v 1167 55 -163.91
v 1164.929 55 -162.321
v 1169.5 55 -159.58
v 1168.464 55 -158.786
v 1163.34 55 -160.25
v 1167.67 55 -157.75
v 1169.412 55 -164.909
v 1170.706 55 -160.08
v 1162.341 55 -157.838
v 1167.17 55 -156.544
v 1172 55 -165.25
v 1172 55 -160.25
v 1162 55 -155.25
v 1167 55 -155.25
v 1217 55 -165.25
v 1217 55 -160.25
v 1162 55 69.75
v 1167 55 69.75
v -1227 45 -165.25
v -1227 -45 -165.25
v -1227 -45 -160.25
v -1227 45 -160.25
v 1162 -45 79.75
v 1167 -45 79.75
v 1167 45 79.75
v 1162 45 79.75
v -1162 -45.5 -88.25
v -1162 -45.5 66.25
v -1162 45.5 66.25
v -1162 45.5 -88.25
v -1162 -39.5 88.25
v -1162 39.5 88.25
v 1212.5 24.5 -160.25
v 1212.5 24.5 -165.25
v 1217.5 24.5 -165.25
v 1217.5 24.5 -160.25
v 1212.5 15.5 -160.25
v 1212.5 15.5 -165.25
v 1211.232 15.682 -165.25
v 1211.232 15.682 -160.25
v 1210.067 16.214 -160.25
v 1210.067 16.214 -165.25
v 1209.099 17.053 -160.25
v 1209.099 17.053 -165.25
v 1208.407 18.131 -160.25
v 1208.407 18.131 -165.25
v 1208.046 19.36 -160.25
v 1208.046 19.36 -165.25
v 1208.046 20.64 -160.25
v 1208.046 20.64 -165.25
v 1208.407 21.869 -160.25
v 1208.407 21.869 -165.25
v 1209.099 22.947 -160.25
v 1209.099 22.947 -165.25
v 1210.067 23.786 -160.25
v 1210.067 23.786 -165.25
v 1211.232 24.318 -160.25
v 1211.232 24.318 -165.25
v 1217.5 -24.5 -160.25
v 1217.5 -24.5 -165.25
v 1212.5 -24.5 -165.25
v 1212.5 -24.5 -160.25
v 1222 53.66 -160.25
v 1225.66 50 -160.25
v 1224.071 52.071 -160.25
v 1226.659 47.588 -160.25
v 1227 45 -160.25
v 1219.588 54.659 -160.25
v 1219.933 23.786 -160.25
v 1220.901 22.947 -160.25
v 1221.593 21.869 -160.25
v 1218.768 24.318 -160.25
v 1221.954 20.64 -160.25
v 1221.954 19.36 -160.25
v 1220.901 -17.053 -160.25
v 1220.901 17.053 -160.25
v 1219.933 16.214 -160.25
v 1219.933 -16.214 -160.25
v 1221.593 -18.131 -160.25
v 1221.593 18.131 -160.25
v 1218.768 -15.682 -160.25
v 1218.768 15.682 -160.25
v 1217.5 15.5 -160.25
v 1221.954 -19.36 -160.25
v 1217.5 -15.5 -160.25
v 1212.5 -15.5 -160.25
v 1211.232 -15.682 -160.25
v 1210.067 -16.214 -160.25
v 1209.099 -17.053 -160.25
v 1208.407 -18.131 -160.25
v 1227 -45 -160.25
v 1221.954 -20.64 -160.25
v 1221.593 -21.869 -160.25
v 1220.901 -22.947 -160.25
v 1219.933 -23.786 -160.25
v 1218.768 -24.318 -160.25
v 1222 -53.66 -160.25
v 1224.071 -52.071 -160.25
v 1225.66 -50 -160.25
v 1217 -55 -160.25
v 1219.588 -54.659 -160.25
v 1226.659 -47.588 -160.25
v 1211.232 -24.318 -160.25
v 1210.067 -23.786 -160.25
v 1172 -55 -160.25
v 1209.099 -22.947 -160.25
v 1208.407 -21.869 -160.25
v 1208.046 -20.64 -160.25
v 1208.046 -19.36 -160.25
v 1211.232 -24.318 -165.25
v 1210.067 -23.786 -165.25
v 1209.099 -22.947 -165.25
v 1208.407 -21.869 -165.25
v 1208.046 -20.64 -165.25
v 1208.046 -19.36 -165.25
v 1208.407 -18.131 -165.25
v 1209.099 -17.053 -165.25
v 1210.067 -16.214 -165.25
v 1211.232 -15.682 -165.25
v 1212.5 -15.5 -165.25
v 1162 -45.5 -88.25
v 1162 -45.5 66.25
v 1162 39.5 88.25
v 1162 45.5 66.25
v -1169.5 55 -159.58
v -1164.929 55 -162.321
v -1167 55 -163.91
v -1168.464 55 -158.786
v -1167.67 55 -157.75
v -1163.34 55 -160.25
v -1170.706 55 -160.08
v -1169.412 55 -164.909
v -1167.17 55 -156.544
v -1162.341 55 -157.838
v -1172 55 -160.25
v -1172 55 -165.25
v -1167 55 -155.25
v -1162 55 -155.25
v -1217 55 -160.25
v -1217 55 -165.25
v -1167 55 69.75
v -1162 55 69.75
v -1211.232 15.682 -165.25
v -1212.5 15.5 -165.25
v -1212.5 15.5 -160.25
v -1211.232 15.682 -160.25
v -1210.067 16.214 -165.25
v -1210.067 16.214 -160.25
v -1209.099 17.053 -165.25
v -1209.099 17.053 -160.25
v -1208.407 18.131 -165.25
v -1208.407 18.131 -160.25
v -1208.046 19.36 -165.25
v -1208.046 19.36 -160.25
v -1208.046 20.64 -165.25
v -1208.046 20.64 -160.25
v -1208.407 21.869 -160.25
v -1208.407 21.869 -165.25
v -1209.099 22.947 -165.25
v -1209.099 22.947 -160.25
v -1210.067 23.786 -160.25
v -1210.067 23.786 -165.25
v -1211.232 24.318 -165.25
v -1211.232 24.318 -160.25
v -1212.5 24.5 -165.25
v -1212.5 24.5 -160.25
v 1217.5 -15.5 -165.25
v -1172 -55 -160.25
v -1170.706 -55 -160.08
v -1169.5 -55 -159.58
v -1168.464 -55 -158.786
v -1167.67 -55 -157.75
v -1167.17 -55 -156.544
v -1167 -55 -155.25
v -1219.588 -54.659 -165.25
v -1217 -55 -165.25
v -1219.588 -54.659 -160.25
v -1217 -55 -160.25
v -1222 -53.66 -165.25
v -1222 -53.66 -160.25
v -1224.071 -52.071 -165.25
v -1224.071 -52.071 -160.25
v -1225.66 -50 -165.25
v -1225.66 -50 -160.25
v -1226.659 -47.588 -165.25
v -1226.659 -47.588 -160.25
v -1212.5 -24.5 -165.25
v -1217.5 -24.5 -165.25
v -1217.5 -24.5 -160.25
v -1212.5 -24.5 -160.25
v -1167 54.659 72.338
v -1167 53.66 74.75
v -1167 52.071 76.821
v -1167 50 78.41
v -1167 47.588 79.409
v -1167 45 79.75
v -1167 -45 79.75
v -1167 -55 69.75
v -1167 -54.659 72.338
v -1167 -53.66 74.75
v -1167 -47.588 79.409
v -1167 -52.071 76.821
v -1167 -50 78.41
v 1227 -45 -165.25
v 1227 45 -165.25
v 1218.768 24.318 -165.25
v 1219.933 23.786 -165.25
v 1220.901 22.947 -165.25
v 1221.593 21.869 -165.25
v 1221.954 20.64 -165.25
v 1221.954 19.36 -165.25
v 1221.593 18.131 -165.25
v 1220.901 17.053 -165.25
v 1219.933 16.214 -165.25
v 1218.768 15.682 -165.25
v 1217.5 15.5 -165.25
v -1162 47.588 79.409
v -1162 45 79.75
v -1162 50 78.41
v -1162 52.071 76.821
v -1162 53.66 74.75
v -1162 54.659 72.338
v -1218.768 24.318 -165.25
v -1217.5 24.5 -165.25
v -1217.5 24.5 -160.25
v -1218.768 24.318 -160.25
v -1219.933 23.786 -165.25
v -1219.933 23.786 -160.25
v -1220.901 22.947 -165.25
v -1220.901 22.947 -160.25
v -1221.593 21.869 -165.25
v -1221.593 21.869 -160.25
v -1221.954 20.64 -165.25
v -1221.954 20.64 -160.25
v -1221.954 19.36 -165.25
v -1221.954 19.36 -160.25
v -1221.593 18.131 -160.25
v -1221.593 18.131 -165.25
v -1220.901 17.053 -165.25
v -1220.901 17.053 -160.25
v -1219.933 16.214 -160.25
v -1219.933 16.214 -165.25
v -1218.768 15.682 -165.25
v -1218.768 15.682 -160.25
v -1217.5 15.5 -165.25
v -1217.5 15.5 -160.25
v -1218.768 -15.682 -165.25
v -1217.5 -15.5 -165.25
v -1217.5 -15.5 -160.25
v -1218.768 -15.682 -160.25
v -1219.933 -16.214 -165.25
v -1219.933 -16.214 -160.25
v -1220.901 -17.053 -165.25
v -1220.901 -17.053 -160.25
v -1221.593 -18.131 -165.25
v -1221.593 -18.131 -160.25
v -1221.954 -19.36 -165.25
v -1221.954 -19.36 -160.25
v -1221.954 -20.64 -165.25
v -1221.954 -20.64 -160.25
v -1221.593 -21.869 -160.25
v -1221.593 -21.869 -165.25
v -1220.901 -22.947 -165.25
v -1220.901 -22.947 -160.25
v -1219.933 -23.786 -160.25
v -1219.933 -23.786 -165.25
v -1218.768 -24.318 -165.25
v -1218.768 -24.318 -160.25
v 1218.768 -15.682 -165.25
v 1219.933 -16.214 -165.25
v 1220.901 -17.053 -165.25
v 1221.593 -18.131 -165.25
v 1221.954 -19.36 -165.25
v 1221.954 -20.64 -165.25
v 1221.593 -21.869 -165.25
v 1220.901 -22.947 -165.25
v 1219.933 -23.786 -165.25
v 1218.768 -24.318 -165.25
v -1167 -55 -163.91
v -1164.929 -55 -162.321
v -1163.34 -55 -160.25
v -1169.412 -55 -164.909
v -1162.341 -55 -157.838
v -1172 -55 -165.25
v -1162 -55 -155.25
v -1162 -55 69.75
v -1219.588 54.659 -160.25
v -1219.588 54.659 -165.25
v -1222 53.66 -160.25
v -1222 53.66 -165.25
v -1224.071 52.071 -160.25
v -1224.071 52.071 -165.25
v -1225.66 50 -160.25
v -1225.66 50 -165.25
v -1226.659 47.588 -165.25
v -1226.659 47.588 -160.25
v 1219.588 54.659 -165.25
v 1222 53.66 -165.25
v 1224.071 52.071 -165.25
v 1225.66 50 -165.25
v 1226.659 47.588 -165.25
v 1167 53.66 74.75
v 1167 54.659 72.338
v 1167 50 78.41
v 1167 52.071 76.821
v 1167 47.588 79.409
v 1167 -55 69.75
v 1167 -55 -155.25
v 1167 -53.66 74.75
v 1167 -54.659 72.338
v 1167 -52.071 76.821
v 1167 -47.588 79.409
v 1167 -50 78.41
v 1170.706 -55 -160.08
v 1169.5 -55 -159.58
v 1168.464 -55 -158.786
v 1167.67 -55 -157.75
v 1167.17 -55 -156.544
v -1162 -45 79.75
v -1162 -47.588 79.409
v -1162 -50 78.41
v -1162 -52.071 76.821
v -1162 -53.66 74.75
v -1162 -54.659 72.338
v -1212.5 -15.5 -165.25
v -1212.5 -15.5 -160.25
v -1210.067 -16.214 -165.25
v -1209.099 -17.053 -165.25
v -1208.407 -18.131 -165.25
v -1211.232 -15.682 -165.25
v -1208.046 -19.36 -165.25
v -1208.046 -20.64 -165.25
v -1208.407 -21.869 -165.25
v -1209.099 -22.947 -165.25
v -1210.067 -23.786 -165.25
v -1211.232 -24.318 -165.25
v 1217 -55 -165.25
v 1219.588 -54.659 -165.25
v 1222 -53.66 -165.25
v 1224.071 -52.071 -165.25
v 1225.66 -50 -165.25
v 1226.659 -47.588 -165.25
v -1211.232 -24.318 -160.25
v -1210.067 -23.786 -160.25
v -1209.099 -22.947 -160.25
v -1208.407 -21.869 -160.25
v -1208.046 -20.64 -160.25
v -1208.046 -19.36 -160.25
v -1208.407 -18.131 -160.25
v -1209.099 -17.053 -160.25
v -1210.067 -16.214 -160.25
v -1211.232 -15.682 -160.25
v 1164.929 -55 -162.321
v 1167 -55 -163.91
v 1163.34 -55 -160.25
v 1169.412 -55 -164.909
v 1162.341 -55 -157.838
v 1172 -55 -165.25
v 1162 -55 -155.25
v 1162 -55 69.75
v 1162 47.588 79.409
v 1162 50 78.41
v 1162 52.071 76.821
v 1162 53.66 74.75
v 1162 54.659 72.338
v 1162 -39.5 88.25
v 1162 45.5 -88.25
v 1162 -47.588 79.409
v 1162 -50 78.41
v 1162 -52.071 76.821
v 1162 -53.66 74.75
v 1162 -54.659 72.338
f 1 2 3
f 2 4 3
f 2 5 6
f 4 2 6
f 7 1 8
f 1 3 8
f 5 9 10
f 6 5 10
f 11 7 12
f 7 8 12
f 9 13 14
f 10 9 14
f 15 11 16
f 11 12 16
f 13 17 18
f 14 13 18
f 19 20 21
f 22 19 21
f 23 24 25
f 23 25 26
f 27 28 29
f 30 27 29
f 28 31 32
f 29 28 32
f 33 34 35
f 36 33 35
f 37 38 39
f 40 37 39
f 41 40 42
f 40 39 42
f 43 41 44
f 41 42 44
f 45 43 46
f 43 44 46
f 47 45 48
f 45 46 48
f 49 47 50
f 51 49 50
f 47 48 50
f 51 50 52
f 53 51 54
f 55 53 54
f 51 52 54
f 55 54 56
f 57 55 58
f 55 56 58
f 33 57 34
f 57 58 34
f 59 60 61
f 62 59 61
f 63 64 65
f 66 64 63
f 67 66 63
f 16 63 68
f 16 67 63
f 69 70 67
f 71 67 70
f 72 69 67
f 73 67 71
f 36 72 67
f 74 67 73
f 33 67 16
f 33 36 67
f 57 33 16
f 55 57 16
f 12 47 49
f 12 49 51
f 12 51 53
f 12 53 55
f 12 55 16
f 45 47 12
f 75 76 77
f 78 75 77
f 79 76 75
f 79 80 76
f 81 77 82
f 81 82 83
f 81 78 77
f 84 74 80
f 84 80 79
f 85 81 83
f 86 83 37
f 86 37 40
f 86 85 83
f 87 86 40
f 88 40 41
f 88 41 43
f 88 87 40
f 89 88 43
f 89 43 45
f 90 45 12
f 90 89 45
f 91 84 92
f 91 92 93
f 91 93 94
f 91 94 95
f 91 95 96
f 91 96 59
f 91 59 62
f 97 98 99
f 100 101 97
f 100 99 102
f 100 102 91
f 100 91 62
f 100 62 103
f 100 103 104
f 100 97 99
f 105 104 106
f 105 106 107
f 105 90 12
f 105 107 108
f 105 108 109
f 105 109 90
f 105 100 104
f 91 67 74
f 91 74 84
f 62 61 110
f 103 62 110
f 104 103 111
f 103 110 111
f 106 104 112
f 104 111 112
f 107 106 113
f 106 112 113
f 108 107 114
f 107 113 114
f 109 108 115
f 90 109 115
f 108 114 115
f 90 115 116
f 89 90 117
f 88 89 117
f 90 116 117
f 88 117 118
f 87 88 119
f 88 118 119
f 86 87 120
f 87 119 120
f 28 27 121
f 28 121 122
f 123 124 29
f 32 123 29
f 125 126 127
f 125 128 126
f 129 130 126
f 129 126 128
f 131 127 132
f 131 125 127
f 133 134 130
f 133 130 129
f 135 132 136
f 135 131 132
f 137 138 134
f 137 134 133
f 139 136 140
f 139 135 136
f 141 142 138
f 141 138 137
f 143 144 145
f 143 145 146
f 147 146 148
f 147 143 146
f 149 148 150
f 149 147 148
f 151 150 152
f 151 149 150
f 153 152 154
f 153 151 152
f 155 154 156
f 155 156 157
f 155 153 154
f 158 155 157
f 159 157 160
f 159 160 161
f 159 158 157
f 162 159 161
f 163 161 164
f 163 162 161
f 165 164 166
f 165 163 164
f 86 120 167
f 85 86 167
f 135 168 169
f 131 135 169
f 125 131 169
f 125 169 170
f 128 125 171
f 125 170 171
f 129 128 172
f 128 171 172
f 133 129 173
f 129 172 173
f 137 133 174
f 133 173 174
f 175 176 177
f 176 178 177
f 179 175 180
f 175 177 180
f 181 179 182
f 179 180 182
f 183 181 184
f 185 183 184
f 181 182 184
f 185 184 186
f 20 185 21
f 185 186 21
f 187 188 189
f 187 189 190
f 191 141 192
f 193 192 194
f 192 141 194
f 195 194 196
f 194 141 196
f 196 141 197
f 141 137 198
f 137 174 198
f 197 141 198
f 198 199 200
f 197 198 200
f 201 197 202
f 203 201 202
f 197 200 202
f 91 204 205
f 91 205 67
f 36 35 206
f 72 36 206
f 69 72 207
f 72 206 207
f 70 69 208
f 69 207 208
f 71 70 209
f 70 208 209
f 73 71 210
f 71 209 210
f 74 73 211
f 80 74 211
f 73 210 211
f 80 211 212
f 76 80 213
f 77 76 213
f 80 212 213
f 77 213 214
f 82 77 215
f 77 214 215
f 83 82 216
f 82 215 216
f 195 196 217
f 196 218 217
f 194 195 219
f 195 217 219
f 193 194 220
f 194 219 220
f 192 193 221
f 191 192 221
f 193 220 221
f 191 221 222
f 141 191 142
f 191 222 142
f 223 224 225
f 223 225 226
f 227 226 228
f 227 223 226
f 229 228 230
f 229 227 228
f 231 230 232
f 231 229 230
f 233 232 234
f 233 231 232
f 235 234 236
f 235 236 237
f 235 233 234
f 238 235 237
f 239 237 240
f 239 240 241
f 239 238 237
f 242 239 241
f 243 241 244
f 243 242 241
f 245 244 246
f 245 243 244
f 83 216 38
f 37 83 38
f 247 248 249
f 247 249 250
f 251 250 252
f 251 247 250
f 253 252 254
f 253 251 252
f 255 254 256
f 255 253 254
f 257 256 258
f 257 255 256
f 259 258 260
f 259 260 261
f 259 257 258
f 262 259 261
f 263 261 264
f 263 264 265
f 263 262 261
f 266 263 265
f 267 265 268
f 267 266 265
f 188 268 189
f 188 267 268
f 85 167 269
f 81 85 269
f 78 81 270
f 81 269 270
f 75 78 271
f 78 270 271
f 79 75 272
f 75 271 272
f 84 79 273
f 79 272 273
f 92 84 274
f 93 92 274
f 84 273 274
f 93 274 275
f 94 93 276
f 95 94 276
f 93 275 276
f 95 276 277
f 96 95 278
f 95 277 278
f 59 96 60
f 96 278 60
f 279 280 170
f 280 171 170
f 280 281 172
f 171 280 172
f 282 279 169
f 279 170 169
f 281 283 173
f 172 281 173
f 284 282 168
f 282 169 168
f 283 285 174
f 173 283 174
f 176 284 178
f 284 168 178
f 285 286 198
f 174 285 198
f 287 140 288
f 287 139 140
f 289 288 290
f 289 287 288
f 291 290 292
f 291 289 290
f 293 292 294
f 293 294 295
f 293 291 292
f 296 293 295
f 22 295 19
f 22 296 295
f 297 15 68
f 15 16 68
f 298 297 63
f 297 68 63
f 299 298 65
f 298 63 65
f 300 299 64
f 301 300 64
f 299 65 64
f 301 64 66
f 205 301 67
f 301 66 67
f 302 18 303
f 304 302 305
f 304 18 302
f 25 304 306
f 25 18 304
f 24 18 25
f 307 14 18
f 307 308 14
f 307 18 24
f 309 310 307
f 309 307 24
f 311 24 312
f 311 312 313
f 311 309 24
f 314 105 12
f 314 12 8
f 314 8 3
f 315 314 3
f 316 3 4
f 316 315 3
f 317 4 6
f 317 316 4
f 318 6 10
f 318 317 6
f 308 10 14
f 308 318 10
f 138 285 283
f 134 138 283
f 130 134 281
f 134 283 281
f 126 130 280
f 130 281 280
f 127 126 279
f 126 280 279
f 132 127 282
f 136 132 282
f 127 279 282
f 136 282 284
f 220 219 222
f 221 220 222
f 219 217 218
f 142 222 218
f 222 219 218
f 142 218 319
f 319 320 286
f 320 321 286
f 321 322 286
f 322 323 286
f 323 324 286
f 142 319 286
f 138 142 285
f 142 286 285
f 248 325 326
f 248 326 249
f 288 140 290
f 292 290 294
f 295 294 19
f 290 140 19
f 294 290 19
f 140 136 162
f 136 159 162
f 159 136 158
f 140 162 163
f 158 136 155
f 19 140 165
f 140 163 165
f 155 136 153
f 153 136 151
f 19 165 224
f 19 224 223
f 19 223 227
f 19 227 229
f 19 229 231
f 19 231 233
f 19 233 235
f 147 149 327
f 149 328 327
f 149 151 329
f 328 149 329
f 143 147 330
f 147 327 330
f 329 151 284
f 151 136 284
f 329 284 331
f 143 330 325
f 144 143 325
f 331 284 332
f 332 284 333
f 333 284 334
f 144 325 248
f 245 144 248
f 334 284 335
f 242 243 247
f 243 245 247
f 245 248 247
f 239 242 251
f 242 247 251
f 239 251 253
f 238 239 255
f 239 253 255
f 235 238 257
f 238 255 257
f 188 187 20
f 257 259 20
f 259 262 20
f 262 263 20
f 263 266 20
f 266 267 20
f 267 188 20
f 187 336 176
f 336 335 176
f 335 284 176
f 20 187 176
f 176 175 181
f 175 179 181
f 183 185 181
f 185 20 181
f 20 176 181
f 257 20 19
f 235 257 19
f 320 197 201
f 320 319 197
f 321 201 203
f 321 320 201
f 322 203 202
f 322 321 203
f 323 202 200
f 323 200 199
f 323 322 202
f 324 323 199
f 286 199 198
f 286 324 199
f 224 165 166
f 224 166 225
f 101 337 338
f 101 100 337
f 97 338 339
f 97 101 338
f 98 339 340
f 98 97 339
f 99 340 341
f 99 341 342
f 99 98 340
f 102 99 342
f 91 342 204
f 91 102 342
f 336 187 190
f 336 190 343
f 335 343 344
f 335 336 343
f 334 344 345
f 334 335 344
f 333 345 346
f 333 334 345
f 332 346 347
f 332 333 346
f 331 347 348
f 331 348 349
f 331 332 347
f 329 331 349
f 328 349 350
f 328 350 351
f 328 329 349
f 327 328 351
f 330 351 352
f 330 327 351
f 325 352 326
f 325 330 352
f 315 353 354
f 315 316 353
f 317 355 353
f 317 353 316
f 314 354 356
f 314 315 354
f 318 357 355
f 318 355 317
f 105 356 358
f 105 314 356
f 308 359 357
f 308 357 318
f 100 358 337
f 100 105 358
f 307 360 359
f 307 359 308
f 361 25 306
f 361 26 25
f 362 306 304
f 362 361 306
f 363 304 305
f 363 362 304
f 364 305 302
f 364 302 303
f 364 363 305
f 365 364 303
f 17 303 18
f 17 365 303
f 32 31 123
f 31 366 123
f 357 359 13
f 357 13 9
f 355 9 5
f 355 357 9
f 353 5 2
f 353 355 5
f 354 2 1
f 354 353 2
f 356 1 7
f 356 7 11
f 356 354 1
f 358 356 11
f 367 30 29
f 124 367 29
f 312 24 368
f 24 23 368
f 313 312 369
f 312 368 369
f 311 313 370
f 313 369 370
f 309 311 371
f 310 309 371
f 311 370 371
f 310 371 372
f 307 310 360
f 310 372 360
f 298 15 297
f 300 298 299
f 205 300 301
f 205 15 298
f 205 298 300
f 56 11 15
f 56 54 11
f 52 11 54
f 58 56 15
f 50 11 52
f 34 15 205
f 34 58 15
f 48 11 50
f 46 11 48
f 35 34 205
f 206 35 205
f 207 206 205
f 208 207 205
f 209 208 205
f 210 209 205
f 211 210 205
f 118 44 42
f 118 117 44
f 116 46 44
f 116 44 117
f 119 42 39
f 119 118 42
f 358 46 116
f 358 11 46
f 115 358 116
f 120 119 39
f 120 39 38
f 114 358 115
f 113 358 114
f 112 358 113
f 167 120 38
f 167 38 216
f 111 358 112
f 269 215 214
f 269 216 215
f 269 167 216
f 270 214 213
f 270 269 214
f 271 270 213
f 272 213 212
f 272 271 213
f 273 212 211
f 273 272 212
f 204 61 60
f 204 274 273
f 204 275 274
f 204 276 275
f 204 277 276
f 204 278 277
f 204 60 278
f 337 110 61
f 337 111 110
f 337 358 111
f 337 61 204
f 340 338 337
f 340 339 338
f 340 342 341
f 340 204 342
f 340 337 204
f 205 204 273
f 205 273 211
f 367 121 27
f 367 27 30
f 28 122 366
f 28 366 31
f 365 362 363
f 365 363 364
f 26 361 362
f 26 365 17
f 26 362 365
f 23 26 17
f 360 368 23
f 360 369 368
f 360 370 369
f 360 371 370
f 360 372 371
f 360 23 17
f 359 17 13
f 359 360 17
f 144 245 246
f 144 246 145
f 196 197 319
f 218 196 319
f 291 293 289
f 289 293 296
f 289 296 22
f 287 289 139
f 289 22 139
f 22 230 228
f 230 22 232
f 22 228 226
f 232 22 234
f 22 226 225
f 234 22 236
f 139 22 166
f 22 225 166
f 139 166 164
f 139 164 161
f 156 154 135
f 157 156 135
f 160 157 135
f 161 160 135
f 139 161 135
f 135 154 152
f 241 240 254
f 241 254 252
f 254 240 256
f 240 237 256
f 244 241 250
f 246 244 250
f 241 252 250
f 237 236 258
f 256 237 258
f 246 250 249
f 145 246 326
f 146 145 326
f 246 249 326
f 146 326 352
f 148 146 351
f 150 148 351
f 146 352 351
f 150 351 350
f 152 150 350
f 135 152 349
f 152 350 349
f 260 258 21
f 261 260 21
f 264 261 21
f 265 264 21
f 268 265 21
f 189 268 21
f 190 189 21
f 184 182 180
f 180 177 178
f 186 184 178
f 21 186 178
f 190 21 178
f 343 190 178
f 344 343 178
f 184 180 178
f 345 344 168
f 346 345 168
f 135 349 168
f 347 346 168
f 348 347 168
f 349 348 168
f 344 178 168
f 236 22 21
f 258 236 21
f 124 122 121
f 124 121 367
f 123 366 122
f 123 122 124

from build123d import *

# Parameters (mm, degrees)
F0_W     = 91
F0_H     = 176.5
F1_DEPTH = 1162
F2_SIZE2 = 22
F2_SIZE  = 6
F4_DEPTH = 55
F5_R     = 10
F6_R     = 10
F8_DEPTH = 25


with BuildPart() as f1:
    # F0 (on Right) → F1 (new body, symmetric)
    with BuildSketch(Plane.YZ):
        Rectangle(F0_W, F0_H)
    extrude(amount=F1_DEPTH, both=True)

    # F2
    f2_edges = [f1.edges().sort_by_distance(p)[0] for p in [
        (0, 45.5, 88.25),
        (0, -45.5, 88.25),
    ]]
    f2_side = f1.faces().sort_by_distance((0, 0, 88.25))[0]
    chamfer(f2_edges, length=F2_SIZE, length2=F2_SIZE2, reference=f2_side)


with BuildPart() as f4:
    # F3 (on Front) → F4 (new body, symmetric)
    with BuildSketch(Plane.XZ):
        with BuildLine():
            Line((1162, 79.75), (1162, 66.25))
            Line((1162, 66.25), (1162, -88.25))
            Line((1162, -88.25), (1162, -155.25))
            ThreePointArc((1162, -155.25), (1164.9289321881, -162.3210678119), (1172, -165.25))
            Line((1172, -165.25), (1227, -165.25))
            Line((1227, -165.25), (1227, -160.25))
            Line((1227, -160.25), (1172, -160.25))
            ThreePointArc((1172, -160.25), (1168.4644660941, -158.7855339059), (1167, -155.25))
            Line((1167, -155.25), (1167, 79.75))
            Line((1167, 79.75), (1162, 79.75))
        make_face()
    extrude(amount=F4_DEPTH, both=True)

    # F5
    f5_edges = [f4.edges().sort_by_distance(p)[0] for p in [
        (1164.5, 55, 79.75),
        (1164.5, -55, 79.75),
    ]]
    fillet(f5_edges, radius=F5_R)

    # F6
    f6_edges = [f4.edges().sort_by_distance(p)[0] for p in [
        (1227, 55, -162.75),
        (1227, -55, -162.75),
    ]]
    fillet(f6_edges, radius=F6_R)

    # F7 (on face) → F8 (cut)
    with BuildSketch(Plane(origin=(0, 0, -165.25), x_dir=(1, 0, 0), z_dir=(0, 0, -1))):
        with BuildLine():
            ThreePointArc((1217.5, -24.5), (1222, -20), (1217.5, -15.5))
            Line((1217.5, -15.5), (1212.5, -15.5))
            ThreePointArc((1212.5, -15.5), (1208, -20), (1212.5, -24.5))
            Line((1212.5, -24.5), (1217.5, -24.5))
        make_face()
        with BuildLine():
            Line((1212.5, 15.5), (1217.5, 15.5))
            ThreePointArc((1217.5, 15.5), (1222, 20), (1217.5, 24.5))
            Line((1217.5, 24.5), (1212.5, 24.5))
            ThreePointArc((1212.5, 24.5), (1208, 20), (1212.5, 15.5))
        make_face()
    extrude(amount=-F8_DEPTH, mode=Mode.SUBTRACT)


with BuildPart() as f9_1:
    # F9: instance of F4
    add(f4.part.mirror(Plane.YZ))


solid = Compound([f1.part, f4.part, f9_1.part])
